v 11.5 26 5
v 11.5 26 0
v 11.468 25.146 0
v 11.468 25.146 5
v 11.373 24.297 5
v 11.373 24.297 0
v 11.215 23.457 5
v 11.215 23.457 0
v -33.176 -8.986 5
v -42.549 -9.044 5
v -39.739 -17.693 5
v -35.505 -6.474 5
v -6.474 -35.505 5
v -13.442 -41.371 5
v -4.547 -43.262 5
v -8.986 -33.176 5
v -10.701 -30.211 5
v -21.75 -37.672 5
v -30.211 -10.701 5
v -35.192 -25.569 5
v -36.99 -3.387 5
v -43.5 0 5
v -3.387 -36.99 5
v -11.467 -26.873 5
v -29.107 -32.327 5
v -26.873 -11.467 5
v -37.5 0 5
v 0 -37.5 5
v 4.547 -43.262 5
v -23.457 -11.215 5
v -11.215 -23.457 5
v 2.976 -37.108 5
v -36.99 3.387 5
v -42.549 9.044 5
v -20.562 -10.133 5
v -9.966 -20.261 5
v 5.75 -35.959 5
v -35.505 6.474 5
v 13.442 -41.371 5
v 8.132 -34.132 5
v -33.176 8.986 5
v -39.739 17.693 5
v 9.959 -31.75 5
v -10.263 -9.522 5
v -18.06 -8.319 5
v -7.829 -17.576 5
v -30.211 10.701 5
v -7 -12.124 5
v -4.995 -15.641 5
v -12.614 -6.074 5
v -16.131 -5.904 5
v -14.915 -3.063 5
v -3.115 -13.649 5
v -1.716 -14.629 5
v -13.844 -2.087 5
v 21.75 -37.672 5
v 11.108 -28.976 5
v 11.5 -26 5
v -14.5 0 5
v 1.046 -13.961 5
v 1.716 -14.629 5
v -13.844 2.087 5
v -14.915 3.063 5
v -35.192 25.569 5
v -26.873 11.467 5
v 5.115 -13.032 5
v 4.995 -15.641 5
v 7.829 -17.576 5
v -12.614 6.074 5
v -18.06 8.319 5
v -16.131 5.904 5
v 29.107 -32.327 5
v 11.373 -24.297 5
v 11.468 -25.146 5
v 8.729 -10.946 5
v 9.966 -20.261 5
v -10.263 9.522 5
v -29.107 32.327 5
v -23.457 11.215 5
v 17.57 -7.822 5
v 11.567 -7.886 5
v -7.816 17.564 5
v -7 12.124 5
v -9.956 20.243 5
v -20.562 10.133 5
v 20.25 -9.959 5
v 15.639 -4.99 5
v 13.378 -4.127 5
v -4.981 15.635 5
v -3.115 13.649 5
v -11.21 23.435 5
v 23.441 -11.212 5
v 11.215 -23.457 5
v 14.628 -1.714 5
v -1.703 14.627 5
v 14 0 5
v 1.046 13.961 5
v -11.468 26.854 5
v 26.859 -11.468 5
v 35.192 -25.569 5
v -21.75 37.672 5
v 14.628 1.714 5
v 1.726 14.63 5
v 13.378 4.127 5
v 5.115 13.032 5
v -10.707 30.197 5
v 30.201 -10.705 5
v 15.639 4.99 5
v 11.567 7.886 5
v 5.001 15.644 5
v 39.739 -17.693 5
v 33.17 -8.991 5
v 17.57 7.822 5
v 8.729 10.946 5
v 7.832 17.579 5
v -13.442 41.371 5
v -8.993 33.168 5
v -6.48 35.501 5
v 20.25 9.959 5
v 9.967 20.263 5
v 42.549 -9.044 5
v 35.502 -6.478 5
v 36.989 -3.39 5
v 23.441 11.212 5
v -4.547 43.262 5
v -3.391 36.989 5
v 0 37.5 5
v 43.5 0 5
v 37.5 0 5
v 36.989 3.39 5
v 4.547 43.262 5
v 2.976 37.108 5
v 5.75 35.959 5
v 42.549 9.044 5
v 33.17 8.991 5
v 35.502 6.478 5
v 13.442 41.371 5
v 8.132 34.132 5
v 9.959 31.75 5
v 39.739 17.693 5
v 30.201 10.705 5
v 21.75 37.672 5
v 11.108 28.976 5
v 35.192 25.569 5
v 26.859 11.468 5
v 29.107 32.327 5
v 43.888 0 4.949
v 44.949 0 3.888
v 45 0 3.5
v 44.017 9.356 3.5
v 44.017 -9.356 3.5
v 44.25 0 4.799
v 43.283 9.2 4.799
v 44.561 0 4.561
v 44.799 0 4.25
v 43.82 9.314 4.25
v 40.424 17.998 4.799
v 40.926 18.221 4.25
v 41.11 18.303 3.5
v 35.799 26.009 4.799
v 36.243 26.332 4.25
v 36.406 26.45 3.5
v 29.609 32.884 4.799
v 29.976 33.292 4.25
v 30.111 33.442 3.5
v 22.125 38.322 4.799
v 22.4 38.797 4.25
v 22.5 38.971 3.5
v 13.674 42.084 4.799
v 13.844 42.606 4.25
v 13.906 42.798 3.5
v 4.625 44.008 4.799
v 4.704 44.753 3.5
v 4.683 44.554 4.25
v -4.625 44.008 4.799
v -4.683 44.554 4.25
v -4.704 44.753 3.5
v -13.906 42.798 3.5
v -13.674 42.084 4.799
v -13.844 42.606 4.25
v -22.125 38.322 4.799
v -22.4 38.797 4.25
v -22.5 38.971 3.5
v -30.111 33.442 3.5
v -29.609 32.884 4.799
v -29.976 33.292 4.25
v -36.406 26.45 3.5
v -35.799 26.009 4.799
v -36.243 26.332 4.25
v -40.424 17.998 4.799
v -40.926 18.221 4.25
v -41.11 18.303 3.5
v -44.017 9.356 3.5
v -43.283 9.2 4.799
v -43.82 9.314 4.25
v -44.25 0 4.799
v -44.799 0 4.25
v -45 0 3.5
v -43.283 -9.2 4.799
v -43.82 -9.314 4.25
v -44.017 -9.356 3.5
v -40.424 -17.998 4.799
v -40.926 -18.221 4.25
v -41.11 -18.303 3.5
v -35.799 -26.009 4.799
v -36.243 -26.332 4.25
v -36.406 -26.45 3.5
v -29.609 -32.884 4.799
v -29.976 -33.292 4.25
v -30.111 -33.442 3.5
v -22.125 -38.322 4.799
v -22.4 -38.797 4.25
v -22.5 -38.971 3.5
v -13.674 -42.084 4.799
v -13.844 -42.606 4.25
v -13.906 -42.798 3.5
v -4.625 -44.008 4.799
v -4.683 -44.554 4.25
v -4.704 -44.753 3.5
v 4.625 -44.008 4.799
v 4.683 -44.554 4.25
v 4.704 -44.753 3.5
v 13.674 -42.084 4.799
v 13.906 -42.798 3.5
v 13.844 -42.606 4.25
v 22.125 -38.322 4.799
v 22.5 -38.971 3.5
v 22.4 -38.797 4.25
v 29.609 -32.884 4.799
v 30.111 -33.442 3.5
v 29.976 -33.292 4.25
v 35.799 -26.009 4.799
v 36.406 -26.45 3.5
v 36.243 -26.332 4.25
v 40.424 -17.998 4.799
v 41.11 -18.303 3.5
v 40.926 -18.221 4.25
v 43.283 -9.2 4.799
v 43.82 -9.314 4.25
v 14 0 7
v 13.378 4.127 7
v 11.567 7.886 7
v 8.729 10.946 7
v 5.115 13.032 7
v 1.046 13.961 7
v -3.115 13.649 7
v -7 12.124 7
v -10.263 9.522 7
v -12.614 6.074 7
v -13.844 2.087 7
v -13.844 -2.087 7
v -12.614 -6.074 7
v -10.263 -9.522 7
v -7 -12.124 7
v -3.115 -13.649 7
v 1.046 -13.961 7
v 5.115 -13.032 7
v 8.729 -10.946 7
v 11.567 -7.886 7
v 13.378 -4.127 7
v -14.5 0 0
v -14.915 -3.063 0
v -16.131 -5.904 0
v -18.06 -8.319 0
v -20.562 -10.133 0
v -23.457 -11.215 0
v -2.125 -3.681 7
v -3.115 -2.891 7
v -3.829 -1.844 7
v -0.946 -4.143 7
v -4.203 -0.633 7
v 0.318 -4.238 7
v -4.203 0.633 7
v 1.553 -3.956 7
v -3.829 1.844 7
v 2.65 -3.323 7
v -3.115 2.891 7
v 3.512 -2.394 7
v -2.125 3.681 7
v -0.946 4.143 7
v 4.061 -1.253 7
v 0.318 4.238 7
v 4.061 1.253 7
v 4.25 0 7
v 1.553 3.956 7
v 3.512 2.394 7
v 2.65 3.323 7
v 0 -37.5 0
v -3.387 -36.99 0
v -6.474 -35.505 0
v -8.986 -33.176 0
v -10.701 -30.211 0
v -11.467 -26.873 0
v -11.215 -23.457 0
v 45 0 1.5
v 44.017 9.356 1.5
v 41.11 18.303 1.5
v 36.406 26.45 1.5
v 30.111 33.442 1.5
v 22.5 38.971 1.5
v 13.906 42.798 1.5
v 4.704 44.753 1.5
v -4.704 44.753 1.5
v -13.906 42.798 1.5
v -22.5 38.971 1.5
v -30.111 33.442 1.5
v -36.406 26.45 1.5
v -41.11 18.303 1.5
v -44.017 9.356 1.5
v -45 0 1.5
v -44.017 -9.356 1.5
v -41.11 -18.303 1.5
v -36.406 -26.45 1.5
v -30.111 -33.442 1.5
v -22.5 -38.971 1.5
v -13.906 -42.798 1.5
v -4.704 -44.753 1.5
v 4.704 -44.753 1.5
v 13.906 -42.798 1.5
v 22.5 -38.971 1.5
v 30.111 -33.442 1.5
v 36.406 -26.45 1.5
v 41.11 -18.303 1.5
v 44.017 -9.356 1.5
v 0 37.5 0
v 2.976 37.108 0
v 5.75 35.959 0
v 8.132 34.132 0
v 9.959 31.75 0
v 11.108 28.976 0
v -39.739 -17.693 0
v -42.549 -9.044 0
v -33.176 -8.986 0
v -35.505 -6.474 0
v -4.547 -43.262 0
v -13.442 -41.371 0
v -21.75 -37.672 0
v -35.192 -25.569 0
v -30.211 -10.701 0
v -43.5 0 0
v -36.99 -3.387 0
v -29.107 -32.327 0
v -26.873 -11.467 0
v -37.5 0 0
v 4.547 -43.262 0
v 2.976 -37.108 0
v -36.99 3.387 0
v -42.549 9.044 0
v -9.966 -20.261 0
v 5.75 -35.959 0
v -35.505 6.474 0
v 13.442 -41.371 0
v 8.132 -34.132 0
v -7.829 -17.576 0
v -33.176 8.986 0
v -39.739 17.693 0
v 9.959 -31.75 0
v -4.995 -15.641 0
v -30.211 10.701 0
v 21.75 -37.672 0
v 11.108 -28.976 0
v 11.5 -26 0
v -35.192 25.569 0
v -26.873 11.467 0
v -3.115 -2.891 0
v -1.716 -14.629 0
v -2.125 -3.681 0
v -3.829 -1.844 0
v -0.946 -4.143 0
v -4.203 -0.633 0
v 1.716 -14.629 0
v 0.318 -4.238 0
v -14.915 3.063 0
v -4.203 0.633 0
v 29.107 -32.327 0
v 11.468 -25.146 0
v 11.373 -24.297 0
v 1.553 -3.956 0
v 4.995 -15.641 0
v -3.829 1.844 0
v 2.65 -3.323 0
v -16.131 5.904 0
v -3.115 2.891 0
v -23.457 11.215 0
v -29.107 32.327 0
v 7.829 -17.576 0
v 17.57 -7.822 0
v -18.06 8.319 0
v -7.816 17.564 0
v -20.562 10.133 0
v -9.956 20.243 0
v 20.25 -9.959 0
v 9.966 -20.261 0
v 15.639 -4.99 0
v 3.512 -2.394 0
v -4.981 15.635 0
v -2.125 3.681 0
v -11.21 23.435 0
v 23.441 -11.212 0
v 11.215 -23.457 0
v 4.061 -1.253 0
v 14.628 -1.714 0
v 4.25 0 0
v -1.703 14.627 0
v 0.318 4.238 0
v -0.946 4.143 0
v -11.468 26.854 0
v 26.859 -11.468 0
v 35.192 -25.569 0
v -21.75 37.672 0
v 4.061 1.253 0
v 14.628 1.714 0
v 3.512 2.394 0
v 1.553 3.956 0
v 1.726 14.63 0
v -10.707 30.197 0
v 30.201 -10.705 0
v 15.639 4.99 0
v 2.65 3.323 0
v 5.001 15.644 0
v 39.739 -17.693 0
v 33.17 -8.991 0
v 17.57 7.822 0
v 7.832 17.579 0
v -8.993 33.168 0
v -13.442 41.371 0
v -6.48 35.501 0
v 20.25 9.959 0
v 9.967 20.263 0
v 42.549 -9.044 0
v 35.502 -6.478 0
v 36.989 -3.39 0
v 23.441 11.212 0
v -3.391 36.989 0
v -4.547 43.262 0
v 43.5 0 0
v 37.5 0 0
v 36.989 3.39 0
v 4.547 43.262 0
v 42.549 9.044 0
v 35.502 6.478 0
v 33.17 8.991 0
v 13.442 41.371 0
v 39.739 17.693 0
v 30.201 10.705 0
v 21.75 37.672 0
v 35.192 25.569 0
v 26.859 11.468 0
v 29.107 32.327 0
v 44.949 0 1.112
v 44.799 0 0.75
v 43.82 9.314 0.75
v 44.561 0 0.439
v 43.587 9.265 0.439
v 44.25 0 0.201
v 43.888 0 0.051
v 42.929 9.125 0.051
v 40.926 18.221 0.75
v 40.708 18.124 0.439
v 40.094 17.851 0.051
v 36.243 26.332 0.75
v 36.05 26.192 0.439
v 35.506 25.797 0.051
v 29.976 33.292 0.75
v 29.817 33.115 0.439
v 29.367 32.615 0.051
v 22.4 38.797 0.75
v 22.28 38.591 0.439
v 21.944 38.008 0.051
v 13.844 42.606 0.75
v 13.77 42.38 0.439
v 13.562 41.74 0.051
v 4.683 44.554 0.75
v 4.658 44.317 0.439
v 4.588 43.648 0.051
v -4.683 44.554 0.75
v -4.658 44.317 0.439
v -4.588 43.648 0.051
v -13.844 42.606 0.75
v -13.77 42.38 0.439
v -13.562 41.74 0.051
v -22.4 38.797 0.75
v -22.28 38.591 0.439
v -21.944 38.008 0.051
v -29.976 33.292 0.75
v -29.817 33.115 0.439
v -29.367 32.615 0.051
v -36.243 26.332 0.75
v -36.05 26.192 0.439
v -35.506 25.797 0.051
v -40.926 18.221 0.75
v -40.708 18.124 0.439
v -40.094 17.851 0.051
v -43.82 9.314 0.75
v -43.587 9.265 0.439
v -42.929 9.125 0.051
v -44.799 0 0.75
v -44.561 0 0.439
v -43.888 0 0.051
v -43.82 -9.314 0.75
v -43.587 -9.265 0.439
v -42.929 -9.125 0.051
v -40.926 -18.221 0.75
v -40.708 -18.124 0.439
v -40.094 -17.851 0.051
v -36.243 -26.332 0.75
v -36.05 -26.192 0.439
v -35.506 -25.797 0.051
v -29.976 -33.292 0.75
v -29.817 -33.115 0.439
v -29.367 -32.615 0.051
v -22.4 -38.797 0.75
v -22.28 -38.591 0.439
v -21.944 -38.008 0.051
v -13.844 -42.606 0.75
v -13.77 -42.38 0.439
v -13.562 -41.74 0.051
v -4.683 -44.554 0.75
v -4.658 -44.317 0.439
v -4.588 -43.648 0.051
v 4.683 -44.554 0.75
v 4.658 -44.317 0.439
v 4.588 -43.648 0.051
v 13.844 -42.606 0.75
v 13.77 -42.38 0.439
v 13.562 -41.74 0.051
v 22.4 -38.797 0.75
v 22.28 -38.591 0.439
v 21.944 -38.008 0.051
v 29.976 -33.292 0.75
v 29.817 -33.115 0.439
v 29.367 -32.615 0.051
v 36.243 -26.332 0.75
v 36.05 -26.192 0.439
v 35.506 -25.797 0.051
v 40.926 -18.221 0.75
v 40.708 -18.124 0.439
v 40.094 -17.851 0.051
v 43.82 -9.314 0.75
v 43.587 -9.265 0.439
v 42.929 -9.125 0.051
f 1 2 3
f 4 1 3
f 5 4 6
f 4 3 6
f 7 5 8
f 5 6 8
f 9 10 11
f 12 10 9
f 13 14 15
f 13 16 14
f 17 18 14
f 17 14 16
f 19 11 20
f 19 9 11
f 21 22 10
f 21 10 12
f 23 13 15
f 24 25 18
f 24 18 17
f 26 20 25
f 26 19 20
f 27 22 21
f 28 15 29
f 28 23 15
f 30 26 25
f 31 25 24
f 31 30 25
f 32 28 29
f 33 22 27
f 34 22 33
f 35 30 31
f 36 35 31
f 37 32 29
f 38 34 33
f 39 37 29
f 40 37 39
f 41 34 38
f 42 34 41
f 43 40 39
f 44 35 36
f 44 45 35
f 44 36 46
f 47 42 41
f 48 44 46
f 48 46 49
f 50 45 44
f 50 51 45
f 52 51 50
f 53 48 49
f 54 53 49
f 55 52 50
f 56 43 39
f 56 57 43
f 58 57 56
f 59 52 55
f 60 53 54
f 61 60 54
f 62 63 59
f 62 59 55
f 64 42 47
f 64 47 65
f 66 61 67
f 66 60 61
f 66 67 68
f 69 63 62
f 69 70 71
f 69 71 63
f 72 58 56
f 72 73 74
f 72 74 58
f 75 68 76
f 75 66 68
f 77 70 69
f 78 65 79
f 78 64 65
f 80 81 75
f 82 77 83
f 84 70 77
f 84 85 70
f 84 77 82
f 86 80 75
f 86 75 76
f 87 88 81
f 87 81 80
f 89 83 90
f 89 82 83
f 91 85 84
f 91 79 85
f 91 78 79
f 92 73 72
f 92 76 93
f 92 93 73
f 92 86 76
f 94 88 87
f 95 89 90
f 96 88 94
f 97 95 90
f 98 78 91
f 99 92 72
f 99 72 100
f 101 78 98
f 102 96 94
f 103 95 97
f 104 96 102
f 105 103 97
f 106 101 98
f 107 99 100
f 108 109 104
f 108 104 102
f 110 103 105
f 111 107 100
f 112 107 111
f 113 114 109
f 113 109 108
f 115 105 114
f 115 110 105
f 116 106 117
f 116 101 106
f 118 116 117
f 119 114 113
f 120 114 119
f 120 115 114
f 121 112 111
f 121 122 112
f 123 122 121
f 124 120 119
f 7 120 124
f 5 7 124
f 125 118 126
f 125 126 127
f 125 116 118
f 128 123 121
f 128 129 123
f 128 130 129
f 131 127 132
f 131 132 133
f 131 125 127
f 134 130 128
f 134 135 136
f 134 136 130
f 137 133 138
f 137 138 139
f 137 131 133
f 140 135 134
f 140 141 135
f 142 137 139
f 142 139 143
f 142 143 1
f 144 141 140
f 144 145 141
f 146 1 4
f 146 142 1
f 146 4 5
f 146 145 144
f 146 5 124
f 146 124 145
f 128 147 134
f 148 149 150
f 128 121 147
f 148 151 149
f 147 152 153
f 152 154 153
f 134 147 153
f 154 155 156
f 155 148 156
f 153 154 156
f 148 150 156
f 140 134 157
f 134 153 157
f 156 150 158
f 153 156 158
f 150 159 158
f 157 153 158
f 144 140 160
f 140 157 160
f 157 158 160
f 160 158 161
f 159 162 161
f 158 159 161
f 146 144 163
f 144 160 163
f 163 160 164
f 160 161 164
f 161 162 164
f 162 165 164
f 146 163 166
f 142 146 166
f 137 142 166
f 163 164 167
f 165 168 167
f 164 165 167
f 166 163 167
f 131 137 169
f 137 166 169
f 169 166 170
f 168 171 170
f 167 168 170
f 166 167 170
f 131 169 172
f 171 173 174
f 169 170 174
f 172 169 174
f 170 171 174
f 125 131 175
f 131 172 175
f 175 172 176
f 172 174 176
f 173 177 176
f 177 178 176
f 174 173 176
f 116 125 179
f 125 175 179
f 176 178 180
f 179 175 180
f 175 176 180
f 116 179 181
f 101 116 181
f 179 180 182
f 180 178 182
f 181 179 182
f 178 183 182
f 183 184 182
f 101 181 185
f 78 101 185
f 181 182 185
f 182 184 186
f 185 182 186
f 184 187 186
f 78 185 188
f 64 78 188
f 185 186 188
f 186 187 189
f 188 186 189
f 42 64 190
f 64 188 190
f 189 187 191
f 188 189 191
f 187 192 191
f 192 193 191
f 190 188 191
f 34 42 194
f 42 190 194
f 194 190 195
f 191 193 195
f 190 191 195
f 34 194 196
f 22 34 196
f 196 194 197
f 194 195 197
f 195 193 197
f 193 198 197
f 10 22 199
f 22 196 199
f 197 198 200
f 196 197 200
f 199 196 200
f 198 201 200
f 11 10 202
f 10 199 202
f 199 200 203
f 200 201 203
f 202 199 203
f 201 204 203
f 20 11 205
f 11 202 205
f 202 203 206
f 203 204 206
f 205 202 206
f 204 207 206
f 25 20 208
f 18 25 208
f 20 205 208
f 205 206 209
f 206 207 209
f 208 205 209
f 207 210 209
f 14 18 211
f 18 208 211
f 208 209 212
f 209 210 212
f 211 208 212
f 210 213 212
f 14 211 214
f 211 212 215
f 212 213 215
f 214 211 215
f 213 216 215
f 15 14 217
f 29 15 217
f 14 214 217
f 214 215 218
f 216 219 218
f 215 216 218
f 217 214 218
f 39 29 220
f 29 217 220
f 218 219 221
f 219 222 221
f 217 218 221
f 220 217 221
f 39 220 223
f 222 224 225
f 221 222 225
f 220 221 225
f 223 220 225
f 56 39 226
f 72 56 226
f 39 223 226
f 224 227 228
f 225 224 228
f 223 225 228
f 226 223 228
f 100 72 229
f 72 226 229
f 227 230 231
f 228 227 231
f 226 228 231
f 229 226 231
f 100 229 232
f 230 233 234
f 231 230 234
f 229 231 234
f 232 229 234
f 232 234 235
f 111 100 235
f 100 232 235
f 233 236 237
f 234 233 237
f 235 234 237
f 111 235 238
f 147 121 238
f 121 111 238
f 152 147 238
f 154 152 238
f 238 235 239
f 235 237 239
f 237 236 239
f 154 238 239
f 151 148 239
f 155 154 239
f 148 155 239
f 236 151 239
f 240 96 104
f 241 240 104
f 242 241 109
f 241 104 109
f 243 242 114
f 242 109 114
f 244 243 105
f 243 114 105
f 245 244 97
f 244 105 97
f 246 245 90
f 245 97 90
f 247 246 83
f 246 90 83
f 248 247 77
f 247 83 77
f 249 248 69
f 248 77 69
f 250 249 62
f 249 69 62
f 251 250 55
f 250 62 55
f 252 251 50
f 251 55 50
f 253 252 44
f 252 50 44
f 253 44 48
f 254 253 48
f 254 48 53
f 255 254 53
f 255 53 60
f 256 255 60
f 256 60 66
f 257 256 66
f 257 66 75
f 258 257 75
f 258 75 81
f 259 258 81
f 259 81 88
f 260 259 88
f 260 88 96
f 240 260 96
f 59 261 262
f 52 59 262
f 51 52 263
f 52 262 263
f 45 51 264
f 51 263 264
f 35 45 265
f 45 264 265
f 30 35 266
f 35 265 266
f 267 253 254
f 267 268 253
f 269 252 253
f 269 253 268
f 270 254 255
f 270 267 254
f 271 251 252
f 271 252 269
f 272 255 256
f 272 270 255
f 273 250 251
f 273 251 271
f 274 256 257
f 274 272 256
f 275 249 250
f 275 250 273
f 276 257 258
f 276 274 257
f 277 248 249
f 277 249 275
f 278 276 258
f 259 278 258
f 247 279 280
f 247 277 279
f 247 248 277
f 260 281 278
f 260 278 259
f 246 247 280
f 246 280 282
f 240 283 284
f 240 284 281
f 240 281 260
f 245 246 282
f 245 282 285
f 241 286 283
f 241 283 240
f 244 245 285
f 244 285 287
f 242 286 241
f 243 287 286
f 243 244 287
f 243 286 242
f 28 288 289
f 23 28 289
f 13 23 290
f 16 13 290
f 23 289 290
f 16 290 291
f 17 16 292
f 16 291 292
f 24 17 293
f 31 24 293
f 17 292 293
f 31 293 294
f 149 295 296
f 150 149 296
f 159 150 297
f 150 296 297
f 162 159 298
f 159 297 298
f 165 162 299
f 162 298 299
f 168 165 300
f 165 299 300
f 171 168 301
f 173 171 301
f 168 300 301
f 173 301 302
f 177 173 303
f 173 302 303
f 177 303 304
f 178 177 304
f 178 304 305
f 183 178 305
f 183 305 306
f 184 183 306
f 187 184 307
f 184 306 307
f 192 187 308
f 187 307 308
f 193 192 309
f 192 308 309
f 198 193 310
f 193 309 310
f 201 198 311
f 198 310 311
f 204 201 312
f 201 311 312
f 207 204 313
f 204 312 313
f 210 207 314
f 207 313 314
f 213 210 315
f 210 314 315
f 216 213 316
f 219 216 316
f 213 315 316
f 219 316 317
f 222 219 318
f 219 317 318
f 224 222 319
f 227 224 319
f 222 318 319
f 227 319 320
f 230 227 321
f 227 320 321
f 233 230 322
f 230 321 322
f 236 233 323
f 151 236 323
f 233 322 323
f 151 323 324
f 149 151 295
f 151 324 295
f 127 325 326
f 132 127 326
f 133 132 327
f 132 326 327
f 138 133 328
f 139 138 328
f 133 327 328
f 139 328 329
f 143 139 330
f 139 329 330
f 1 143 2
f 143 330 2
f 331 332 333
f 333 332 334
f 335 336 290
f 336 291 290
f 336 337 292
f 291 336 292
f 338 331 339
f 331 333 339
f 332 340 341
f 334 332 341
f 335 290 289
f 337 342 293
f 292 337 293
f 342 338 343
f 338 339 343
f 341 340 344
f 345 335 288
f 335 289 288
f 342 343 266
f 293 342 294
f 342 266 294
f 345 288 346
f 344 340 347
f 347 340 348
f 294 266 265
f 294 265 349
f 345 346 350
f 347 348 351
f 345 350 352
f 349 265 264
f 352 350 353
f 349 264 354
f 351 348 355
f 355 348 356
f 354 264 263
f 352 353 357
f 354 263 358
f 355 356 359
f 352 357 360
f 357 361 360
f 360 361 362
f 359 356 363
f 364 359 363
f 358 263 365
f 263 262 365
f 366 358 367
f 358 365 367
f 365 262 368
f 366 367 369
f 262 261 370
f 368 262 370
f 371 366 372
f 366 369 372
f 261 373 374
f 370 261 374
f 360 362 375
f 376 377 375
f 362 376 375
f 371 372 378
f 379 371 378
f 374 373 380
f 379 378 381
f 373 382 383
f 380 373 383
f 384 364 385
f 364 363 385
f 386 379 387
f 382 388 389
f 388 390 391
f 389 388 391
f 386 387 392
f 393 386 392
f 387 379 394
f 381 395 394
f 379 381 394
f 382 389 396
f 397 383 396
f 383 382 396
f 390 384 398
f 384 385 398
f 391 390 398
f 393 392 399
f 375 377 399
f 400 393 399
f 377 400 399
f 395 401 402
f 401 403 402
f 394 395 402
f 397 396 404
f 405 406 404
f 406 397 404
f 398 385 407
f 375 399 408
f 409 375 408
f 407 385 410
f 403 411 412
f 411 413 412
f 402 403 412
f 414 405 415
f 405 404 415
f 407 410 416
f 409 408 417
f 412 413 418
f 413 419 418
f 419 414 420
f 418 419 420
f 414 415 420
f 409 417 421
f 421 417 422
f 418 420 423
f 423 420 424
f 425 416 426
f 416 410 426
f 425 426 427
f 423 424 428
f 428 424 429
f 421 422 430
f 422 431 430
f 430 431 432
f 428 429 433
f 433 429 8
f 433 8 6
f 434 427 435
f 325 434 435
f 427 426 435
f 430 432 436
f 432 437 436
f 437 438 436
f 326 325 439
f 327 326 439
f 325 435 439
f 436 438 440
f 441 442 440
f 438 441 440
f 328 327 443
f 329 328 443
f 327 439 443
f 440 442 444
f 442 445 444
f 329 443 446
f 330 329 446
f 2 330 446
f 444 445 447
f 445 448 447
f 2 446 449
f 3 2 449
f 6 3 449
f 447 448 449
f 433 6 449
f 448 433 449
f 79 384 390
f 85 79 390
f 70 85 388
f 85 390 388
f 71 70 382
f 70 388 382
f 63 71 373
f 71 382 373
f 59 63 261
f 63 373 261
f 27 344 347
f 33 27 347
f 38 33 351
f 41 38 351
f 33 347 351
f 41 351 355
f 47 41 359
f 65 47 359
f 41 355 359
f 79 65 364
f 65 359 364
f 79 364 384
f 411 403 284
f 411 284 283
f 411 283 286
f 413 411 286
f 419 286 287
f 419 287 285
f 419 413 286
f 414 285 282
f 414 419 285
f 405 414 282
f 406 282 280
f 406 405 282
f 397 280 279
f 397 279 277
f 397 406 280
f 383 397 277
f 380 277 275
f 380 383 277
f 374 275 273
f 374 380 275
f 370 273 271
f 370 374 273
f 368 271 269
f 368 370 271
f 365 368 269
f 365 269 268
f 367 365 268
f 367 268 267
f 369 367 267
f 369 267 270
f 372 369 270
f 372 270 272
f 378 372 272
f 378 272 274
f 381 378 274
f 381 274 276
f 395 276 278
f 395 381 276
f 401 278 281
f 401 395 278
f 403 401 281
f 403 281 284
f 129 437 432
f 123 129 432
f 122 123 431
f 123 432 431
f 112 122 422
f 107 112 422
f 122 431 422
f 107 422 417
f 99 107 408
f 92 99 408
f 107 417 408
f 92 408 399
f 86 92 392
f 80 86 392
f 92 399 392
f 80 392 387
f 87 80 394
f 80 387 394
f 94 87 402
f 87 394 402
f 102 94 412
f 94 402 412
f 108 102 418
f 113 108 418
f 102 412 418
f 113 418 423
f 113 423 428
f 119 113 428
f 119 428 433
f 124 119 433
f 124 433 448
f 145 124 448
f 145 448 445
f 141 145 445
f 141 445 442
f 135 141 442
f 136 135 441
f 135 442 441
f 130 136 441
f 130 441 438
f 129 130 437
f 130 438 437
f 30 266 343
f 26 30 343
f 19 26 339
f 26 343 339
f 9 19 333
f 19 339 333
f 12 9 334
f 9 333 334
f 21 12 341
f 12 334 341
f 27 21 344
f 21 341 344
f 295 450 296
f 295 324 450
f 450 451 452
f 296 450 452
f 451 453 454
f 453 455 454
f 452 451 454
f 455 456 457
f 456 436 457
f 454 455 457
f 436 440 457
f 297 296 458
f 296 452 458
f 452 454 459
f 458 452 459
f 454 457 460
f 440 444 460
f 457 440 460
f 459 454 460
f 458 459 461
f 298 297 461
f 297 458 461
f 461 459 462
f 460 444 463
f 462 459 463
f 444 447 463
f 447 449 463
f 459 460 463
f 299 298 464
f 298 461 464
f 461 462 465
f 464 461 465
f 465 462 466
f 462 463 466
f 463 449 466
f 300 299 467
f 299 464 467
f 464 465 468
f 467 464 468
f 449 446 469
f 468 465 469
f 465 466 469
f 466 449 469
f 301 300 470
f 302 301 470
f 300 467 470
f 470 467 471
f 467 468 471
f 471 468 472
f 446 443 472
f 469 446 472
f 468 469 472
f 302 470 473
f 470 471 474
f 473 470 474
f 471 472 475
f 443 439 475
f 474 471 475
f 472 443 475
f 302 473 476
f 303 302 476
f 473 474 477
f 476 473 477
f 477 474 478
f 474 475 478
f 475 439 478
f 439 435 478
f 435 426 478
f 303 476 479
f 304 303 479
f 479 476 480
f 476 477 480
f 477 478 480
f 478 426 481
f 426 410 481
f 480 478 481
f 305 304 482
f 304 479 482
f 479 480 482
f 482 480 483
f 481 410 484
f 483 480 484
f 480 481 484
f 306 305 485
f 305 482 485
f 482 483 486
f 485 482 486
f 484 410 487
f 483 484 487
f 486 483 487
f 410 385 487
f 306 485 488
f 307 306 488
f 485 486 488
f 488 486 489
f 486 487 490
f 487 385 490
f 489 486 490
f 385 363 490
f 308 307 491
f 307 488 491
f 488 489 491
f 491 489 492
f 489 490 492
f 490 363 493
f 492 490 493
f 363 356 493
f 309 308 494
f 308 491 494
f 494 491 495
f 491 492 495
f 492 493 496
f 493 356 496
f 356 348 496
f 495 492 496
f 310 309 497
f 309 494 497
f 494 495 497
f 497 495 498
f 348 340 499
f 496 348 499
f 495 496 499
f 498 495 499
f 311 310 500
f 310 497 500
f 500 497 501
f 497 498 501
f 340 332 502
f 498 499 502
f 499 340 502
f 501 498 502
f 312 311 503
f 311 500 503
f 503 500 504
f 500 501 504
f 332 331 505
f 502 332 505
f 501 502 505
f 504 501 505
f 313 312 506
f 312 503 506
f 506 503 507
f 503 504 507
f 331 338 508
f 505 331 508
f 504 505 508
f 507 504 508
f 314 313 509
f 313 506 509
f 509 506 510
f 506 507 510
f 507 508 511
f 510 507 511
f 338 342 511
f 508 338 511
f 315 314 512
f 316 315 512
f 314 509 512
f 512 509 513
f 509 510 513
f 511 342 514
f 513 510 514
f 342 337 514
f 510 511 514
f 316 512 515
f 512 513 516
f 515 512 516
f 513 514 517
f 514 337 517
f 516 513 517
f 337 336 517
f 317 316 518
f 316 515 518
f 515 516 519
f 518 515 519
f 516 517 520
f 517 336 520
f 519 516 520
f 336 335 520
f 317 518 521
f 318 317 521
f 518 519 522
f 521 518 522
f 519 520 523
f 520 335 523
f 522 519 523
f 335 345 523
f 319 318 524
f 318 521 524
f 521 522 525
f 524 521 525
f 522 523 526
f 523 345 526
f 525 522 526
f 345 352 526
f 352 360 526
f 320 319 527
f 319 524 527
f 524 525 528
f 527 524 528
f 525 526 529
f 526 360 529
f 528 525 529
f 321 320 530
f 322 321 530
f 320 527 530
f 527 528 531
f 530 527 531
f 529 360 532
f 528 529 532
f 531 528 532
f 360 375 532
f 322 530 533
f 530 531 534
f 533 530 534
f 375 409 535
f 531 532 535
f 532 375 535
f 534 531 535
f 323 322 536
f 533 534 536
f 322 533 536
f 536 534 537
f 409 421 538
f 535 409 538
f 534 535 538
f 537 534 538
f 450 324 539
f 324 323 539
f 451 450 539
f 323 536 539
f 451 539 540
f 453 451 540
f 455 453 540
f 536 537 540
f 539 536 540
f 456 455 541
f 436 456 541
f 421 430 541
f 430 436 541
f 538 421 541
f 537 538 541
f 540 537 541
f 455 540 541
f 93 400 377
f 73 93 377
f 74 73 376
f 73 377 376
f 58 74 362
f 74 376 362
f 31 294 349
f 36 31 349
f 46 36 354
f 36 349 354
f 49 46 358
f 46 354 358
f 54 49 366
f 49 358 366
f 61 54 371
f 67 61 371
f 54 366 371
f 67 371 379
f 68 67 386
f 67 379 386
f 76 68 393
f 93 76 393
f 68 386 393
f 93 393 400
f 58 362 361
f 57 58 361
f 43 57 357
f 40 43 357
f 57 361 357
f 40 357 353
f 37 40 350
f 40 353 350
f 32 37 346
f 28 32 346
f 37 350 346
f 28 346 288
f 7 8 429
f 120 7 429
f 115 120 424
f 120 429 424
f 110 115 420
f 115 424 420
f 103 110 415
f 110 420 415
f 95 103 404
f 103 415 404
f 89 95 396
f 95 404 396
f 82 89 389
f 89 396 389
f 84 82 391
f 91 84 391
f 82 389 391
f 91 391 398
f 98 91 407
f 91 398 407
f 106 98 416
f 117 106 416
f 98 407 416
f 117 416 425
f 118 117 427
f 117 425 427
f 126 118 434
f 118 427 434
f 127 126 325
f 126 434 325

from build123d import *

# Parameters (mm, degrees)
F0_R     = 45
F0_R_2   = 14
F1_DEPTH = 5
F0_R_3   = 4.25
F2_DEPTH = 7
F3_R     = 1.5


with BuildPart() as f1:
    # F0 (on Top) → F1 (new body)
    with BuildSketch(Plane.XY):
        Circle(F0_R)
        with BuildLine():
            ThreePointArc((0, 37.5), (26.5165042945, 26.5165042945), (37.5, 0))
            ThreePointArc((37.5, 0), (26.5165043235, -26.5165042654), (8.22e-08, -37.5))
            ThreePointArc((8.22e-08, -37.5), (-26.516504245, -26.516504344), (-37.5, -5.77e-08))
            ThreePointArc((-37.5, -5.77e-08), (-26.5165043149, 26.5165042741), (0, 37.5))
        make_face(mode=Mode.SUBTRACT)
        with BuildLine():
            ThreePointArc((23.4567307692, -11.2152477289), (14.5, 0), (23.4567307692, 11.2152477289))
            ThreePointArc((23.4567307692, 11.2152477289), (18.3847763109, 18.3847763108), (11.2152477289, 23.4567307692))
            ThreePointArc((11.2152477289, 23.4567307692), (0, 14.5), (-11.2152477289, 23.4567307692))
            ThreePointArc((-11.2152477289, 23.4567307692), (-18.3847763109, 18.3847763108), (-23.4567307692, 11.2152477289))
            ThreePointArc((-23.4567307692, 11.2152477289), (-17.0139664992, 7.1764337887), (-14.5, 0))
            ThreePointArc((-14.5, 0), (-17.0139664992, -7.1764337887), (-23.4567307692, -11.2152477289))
            ThreePointArc((-23.4567307692, -11.2152477289), (-18.3847763109, -18.3847763108), (-11.2152477289, -23.4567307692))
            ThreePointArc((-11.2152477289, -23.4567307692), (0, -14.5), (11.2152477289, -23.4567307692))
            ThreePointArc((11.2152477289, -23.4567307692), (18.3847763109, -18.3847763108), (23.4567307692, -11.2152477289))
        make_face()
        Circle(F0_R_2, mode=Mode.SUBTRACT)
        with BuildLine():
            ThreePointArc((-11.2152477289, 23.4567307692), (-8.9860335008, 33.1764337887), (0, 37.5))
            ThreePointArc((0, 37.5), (-26.5165043149, 26.5165042741), (-37.5, -5.77e-08))
            ThreePointArc((-37.5, -5.77e-08), (-33.1764338112, 8.9860334828), (-23.4567307692, 11.2152477289))
            ThreePointArc((-23.4567307692, 11.2152477289), (-18.3847763109, 18.3847763108), (-11.2152477289, 23.4567307692))
        make_face()
        with BuildLine():
            ThreePointArc((23.4567307692, 11.2152477289), (33.1764337887, 8.9860335008), (37.5, 0))
            ThreePointArc((37.5, 0), (26.5165042945, 26.5165042945), (0, 37.5))
            ThreePointArc((0, 37.5), (8.1317279836, 34.1317279836), (11.5, 26))
            ThreePointArc((11.5, 26), (11.4285902211, 24.7204197723), (11.2152477289, 23.4567307692))
            ThreePointArc((11.2152477289, 23.4567307692), (18.3847763109, 18.3847763108), (23.4567307692, 11.2152477289))
        make_face()
        with BuildLine():
            ThreePointArc((-37.5, -5.77e-08), (-26.516504245, -26.516504344), (8.22e-08, -37.5))
            ThreePointArc((8.22e-08, -37.5), (-8.9860334751, -33.1764338208), (-11.2152477289, -23.4567307692))
            ThreePointArc((-11.2152477289, -23.4567307692), (-18.3847763109, -18.3847763108), (-23.4567307692, -11.2152477289))
            ThreePointArc((-23.4567307692, -11.2152477289), (-33.1764337661, -8.9860335188), (-37.5, -5.77e-08))
        make_face()
        with BuildLine():
            ThreePointArc((8.22e-08, -37.5), (26.5165043235, -26.5165042654), (37.5, 0))
            ThreePointArc((37.5, 0), (33.1764337887, -8.9860335008), (23.4567307692, -11.2152477289))
            ThreePointArc((23.4567307692, -11.2152477289), (18.3847763109, -18.3847763108), (11.2152477289, -23.4567307692))
            ThreePointArc((11.2152477289, -23.4567307692), (11.4285902211, -24.7204197723), (11.5, -26))
            ThreePointArc((11.5, -26), (8.1317280127, -34.1317279546), (8.22e-08, -37.5))
        make_face()
    extrude(amount=F1_DEPTH)

    # F0 (on Top) → F2 (join)
    with BuildSketch(Plane.XY):
        Circle(F0_R_2)
        Circle(F0_R_3, mode=Mode.SUBTRACT)
    extrude(amount=F2_DEPTH)

    # F3
    f3_edges = [f1.edges().sort_by_distance(p)[0] for p in [
        (-45, 0, 5),
        (-45, 0, 0),
    ]]
    fillet(f3_edges, radius=F3_R)


solid = f1.part
